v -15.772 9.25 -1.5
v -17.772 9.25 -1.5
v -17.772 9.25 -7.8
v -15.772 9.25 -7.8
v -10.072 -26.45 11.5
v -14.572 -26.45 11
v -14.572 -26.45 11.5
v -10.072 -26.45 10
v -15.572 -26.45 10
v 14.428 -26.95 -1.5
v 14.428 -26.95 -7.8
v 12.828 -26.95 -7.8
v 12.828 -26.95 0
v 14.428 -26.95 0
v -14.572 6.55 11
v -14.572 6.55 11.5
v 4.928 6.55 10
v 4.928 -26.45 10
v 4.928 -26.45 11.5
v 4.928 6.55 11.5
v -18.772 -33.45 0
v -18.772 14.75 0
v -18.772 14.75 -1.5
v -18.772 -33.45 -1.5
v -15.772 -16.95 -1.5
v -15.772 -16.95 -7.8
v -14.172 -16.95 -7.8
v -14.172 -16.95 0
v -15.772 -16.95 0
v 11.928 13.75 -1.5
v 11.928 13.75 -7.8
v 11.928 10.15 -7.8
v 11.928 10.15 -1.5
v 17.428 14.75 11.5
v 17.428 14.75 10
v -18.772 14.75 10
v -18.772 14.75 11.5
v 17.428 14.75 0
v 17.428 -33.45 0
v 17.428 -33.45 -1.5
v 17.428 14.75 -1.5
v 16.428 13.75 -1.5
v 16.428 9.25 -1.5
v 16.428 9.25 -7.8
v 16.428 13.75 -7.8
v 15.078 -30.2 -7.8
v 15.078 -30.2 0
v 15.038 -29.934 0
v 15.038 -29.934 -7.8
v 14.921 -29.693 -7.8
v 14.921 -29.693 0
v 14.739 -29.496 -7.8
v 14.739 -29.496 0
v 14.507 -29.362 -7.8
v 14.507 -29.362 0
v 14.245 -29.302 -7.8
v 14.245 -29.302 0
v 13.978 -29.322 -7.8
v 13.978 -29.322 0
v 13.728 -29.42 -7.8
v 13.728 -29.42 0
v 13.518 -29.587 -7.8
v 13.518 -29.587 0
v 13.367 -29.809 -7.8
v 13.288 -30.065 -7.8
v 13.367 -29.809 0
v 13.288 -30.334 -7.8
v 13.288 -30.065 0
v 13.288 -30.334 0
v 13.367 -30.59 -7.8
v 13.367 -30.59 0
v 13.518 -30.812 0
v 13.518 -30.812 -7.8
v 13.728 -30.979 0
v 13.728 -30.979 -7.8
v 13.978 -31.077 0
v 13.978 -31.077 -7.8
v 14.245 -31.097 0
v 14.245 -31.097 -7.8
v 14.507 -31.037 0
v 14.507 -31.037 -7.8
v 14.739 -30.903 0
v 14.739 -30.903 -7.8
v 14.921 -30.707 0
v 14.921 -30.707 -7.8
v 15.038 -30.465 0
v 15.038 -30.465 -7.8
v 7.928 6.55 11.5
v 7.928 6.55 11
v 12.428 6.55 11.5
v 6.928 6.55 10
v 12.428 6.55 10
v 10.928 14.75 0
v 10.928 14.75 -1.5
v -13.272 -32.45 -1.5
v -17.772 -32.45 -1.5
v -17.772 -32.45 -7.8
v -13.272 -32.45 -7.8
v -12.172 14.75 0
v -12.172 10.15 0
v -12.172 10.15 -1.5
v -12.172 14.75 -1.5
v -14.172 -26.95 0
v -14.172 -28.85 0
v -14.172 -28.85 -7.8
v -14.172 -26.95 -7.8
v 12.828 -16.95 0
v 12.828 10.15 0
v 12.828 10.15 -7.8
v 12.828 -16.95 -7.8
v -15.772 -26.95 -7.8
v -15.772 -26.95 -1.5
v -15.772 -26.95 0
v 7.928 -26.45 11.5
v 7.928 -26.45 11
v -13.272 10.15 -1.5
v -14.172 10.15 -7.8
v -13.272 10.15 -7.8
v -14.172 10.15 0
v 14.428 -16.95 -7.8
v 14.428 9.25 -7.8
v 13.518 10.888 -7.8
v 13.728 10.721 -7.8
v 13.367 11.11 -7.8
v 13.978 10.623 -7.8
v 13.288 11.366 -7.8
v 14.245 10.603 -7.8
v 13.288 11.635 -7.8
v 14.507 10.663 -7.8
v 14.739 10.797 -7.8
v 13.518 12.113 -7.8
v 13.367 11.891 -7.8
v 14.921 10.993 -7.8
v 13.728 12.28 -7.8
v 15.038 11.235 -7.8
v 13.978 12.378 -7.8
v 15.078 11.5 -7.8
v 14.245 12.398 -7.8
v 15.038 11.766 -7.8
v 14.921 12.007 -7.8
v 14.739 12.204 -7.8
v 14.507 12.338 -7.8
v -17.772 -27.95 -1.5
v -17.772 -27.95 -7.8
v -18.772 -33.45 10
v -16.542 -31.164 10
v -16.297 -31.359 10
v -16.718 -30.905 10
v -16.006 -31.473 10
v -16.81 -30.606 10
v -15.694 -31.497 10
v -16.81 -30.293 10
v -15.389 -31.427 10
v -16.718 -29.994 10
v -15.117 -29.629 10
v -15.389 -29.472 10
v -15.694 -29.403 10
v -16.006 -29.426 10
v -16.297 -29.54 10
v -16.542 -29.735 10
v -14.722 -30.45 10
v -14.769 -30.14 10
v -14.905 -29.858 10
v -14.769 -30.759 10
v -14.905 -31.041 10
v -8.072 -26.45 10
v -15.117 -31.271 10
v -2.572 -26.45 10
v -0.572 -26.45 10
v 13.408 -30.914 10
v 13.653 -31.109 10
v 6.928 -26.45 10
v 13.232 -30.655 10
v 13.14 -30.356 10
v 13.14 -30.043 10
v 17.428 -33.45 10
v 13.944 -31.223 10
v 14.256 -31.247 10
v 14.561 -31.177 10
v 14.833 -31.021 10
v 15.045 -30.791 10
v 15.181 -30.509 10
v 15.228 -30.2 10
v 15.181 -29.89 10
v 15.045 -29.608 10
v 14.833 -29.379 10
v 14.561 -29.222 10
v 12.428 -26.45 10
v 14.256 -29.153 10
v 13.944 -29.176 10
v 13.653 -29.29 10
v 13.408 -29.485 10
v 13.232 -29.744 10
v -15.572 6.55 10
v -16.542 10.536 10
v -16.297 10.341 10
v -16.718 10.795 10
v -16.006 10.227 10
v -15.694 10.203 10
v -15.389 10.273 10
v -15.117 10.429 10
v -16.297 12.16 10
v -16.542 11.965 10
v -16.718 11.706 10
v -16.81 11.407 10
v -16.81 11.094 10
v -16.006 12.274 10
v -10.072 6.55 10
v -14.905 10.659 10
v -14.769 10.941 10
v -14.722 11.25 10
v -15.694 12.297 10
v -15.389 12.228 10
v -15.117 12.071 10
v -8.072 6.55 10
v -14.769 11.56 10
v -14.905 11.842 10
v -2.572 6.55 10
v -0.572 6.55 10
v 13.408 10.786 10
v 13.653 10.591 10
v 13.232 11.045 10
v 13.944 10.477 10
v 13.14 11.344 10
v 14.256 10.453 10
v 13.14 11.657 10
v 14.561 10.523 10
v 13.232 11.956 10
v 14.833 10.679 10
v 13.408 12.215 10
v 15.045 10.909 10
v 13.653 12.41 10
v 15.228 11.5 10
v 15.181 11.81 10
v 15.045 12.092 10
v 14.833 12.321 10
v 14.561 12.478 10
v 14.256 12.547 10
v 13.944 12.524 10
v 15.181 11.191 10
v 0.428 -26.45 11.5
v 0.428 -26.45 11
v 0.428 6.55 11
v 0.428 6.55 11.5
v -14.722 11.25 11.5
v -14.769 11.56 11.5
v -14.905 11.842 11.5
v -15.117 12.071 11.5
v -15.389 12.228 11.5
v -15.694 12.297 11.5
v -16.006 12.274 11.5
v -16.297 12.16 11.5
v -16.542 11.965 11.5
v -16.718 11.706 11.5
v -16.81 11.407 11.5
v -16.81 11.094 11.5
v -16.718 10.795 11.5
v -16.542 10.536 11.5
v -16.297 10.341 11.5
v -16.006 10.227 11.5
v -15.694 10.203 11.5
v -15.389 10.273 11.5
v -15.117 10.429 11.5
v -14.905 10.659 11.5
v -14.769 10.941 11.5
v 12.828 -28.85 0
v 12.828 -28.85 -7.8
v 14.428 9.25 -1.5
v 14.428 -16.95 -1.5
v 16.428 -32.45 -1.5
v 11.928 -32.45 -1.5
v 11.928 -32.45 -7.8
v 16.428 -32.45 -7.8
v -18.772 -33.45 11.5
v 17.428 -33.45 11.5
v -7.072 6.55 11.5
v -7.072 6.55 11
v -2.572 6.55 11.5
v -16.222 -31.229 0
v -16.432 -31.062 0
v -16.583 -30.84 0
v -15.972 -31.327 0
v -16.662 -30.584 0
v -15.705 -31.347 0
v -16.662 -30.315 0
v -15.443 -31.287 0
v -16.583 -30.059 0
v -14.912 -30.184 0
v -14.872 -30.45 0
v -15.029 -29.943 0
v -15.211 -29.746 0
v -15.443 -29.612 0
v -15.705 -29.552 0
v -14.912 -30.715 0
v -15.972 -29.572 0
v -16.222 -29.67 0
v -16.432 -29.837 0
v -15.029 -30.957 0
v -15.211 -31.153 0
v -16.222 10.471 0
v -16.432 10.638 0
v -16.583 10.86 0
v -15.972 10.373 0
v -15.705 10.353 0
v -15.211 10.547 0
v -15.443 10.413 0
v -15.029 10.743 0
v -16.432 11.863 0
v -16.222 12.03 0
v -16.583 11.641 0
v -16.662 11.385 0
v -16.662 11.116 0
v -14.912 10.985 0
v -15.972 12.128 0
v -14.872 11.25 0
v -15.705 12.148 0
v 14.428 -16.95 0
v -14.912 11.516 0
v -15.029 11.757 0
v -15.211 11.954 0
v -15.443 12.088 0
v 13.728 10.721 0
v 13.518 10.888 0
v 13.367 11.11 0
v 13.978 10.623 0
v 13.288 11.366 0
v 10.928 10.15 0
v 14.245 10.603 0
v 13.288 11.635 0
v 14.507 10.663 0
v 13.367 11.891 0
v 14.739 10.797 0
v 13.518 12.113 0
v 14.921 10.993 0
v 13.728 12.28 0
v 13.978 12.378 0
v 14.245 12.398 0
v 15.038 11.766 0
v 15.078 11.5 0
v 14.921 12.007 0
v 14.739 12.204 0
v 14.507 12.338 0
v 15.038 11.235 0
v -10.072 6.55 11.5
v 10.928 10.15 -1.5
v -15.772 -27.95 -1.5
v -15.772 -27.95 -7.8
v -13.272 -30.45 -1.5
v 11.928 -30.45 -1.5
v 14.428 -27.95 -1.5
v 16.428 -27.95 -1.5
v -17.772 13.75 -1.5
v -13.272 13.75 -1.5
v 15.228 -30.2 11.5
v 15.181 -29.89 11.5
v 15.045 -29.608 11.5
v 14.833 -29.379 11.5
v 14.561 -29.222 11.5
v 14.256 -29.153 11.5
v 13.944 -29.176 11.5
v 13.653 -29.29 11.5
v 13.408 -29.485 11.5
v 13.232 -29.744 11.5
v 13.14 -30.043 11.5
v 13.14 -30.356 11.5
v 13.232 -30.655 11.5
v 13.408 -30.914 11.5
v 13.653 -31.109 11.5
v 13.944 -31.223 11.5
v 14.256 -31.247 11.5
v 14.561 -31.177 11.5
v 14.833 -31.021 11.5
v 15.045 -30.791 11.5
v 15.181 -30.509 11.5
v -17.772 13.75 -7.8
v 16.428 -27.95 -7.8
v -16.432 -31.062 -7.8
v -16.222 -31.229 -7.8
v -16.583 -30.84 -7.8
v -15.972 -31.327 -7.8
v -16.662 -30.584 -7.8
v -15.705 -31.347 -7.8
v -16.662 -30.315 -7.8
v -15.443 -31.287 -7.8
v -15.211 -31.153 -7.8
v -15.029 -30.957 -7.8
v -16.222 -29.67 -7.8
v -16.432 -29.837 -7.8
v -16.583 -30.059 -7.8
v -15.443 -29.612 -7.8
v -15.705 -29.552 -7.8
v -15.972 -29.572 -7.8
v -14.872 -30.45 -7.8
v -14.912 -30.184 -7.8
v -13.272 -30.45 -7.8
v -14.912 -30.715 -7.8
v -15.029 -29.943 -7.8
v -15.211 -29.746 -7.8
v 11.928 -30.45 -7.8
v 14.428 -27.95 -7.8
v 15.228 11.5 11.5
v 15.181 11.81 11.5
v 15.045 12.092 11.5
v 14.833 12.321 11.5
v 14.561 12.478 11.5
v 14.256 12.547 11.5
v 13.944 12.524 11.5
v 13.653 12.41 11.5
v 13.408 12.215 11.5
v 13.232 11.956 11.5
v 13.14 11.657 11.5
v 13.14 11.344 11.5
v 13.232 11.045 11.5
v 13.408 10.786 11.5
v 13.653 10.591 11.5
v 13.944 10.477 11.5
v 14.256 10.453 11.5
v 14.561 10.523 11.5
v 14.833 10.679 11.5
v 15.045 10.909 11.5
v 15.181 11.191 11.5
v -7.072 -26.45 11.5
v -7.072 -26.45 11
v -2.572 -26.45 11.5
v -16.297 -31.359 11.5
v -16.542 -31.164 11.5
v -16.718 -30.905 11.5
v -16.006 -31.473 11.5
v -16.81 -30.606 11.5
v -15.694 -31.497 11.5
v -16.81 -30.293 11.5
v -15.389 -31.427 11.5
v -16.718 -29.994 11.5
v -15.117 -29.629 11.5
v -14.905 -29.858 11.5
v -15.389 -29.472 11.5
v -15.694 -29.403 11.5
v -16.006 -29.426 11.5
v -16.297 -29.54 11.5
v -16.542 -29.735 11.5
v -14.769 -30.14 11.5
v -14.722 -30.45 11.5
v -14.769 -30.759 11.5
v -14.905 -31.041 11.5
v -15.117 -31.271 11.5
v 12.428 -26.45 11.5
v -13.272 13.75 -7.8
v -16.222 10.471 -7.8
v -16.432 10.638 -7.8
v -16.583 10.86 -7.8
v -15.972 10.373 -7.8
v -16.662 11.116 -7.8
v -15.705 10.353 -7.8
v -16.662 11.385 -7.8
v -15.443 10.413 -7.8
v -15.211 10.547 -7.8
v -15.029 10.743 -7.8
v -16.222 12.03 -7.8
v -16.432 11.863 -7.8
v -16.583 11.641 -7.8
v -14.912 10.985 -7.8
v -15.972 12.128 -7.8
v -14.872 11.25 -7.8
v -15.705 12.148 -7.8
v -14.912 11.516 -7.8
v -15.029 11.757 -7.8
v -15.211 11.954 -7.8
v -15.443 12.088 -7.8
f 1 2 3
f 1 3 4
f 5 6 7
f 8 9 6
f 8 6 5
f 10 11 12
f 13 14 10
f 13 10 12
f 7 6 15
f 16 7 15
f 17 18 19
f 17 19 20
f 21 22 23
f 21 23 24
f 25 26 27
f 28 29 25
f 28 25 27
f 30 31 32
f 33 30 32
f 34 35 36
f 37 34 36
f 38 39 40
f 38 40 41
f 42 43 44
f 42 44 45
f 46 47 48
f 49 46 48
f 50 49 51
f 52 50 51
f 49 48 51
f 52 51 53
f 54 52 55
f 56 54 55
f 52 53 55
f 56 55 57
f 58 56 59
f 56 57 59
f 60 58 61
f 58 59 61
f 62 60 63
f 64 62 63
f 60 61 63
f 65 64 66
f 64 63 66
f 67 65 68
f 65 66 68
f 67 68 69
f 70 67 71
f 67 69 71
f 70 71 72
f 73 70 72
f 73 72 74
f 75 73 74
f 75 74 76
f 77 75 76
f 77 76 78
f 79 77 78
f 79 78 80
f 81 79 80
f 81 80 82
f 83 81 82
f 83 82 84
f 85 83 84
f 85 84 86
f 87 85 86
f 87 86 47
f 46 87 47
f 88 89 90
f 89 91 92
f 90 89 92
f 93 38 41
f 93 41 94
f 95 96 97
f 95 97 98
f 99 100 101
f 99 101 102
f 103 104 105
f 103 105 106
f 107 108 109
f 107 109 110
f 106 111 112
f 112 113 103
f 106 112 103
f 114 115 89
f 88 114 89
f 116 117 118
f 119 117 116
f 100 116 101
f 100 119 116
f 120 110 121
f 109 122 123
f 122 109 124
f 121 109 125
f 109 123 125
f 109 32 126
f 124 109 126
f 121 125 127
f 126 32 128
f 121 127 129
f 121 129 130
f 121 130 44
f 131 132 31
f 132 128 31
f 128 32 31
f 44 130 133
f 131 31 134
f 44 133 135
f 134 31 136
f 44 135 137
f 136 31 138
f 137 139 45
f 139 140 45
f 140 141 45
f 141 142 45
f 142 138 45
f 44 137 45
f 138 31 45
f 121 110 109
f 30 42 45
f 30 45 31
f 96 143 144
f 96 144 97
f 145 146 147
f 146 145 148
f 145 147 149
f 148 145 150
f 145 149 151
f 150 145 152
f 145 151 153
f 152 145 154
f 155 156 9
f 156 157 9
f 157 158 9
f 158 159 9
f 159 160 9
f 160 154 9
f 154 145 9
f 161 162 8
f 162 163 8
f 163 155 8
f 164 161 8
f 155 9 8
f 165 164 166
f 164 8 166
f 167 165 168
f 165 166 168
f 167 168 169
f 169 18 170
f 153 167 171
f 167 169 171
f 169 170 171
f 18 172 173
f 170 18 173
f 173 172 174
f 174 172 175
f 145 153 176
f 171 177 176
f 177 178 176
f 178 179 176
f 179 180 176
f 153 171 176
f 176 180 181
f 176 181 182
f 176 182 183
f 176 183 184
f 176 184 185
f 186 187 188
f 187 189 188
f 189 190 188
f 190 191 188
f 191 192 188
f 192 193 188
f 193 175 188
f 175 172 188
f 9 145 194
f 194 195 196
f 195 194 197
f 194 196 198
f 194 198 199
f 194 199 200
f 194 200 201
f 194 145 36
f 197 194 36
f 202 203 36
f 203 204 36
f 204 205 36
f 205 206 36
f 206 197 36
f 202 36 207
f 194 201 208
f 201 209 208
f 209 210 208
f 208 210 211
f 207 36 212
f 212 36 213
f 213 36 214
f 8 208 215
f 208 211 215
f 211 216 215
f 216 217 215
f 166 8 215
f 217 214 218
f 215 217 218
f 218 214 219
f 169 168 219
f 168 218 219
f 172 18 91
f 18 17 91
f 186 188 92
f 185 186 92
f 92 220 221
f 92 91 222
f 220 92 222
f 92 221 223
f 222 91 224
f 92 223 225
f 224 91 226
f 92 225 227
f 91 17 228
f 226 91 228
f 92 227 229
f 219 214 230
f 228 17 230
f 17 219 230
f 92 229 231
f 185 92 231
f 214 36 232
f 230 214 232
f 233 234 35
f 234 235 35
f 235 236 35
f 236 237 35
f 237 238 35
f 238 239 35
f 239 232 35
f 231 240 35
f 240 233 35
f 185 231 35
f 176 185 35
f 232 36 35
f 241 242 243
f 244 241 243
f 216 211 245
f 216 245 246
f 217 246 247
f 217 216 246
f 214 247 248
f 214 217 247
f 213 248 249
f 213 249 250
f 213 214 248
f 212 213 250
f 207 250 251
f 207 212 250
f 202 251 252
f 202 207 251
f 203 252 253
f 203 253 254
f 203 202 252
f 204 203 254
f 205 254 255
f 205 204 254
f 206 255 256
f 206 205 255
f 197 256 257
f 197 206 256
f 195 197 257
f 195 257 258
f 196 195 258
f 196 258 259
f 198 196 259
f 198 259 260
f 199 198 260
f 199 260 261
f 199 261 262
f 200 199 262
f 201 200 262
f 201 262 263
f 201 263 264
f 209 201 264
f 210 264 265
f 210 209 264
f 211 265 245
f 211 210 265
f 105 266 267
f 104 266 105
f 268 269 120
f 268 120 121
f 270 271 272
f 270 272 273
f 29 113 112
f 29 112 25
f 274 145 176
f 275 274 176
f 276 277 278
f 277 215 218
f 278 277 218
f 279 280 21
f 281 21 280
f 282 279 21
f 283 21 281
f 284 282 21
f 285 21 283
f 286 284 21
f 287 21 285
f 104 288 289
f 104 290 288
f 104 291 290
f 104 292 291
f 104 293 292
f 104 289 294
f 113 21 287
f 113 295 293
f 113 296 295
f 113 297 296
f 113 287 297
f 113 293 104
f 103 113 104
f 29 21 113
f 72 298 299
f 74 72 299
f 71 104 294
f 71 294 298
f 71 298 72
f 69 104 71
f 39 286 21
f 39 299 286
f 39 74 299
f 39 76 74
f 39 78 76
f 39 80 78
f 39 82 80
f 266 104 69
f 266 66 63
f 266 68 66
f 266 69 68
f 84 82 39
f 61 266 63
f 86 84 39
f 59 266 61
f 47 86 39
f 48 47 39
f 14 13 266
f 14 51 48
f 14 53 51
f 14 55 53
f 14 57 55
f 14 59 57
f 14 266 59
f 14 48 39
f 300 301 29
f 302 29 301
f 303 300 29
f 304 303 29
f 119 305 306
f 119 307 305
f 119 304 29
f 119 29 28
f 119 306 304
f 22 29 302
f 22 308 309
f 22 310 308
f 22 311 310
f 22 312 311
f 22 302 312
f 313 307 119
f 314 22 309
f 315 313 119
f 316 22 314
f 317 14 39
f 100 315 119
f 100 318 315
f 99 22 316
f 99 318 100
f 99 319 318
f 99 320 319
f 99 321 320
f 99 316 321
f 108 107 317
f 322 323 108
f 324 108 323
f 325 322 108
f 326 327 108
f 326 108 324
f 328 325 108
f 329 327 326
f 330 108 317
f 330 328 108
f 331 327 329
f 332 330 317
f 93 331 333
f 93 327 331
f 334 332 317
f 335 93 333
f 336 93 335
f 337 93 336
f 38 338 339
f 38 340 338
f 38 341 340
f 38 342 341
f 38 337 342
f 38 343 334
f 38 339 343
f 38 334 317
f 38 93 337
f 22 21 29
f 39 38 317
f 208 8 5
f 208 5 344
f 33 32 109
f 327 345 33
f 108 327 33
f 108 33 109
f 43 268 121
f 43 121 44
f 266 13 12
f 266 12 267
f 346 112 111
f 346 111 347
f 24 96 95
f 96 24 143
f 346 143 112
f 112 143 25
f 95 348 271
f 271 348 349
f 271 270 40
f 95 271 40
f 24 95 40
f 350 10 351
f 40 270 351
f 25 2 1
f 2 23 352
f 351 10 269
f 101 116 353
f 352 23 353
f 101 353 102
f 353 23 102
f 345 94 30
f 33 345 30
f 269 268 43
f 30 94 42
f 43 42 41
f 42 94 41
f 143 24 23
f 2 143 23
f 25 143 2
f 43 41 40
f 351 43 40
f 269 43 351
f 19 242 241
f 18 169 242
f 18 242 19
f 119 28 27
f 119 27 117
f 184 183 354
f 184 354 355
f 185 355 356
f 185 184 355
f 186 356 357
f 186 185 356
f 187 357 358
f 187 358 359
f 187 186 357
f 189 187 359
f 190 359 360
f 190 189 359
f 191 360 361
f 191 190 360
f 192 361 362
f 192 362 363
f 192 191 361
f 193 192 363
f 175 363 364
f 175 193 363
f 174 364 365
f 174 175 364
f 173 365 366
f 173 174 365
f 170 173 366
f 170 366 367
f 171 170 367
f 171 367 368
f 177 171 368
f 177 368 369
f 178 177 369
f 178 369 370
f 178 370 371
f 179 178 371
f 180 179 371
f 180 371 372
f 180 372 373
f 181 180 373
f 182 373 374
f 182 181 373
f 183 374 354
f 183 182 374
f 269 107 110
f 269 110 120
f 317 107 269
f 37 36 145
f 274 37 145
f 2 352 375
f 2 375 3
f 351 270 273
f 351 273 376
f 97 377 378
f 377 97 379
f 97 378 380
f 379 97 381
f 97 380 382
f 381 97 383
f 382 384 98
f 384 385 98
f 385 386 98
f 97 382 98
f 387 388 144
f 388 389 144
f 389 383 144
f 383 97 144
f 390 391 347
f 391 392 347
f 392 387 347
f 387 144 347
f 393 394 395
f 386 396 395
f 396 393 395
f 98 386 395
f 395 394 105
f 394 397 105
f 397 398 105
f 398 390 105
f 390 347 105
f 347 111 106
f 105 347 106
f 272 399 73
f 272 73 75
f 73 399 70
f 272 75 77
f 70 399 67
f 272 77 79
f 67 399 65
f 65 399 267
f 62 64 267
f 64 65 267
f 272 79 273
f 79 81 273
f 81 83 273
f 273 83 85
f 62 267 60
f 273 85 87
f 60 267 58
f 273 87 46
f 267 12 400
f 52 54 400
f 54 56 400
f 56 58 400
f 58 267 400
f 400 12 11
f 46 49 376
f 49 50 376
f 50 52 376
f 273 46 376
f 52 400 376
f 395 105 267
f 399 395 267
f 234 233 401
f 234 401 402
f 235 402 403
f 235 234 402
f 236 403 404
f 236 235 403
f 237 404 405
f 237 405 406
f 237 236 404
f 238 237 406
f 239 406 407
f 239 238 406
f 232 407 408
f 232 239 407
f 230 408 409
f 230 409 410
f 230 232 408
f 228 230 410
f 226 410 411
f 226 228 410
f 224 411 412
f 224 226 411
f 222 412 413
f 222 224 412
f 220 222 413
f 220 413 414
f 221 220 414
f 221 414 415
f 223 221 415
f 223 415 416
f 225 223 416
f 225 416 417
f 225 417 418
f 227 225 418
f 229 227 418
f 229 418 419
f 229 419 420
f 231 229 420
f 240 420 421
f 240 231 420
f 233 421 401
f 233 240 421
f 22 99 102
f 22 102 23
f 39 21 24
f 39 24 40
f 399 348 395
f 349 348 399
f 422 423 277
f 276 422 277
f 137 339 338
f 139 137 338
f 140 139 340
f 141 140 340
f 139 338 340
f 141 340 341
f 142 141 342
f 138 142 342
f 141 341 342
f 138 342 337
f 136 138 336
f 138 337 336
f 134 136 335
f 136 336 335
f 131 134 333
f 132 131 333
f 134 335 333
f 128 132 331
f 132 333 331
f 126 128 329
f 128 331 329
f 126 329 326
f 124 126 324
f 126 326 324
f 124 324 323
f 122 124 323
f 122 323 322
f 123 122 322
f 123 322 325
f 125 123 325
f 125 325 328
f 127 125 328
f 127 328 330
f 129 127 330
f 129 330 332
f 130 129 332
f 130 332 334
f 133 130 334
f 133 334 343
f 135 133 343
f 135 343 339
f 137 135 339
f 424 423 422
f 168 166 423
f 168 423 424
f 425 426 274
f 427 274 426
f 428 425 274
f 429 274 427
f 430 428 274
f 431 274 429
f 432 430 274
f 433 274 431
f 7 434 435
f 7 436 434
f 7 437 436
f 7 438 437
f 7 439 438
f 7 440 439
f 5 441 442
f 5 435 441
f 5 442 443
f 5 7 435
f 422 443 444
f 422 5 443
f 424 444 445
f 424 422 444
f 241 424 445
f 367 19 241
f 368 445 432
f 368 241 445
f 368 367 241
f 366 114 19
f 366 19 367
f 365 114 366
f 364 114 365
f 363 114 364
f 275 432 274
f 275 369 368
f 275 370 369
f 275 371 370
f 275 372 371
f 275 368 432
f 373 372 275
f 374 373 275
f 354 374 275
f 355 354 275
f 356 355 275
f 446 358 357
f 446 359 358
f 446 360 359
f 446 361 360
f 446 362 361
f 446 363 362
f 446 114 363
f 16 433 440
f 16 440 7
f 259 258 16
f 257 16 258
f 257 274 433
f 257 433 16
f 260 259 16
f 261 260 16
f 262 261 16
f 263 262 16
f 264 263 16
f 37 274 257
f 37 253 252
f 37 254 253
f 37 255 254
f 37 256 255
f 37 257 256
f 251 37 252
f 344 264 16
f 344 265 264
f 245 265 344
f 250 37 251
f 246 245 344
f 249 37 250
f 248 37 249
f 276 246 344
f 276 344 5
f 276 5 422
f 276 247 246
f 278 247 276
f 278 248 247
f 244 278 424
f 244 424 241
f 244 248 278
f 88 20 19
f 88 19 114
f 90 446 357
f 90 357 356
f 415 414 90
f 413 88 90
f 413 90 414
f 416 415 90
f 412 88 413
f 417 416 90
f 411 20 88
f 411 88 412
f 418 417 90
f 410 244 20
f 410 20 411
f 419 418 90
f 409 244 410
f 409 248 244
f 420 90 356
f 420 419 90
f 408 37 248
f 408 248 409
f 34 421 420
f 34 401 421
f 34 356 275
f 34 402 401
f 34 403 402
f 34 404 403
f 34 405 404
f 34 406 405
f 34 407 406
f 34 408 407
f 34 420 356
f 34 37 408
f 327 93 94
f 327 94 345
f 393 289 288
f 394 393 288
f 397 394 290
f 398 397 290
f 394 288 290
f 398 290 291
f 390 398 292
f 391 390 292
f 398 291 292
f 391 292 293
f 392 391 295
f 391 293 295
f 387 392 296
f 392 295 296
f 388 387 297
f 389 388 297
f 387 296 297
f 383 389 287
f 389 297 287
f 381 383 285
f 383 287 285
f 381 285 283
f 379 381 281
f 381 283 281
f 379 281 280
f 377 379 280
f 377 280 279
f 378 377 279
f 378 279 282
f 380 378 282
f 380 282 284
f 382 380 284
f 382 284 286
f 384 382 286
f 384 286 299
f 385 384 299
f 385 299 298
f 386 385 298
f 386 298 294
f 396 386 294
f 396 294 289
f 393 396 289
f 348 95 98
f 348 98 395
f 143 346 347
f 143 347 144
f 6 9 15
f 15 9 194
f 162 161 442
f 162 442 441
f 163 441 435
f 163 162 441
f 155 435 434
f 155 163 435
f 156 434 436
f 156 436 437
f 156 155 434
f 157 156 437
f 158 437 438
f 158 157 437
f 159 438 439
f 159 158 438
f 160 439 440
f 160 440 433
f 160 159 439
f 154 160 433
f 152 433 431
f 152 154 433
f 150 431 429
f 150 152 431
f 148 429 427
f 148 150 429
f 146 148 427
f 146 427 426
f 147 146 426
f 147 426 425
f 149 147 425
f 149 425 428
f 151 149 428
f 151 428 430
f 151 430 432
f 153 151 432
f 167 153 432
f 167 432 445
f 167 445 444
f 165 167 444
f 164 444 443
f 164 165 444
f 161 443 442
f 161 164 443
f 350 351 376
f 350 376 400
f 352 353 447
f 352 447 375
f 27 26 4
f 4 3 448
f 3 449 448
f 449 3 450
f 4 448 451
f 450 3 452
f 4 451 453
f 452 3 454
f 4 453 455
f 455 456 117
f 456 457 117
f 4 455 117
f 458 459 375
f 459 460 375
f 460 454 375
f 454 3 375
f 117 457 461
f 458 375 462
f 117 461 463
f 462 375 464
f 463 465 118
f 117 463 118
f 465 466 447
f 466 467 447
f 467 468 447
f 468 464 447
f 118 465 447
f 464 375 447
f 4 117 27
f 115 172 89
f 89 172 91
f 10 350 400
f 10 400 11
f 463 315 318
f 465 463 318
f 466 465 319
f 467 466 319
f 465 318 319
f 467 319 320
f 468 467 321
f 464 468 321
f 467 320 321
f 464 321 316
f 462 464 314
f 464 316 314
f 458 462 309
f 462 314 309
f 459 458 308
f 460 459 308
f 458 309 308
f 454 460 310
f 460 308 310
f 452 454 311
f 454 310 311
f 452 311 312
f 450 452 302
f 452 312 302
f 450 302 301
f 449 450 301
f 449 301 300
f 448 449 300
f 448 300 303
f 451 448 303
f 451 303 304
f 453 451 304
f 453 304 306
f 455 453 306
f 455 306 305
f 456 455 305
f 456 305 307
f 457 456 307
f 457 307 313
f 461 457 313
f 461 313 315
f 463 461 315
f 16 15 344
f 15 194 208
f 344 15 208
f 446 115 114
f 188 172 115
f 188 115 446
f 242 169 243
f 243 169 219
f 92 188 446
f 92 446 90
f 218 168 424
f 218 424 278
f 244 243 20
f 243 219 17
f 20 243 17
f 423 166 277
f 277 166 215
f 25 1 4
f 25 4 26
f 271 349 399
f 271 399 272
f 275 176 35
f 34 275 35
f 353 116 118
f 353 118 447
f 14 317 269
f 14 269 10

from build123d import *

# Parameters (mm, degrees)
F0_W     = 1.6
F0_H     = 1
F1_DEPTH = 7.8
F0_H_2   = 26.2
F0_W_2   = 0.5
F2_DEPTH = 1.5
F3_DEPTH = 7.8
F5_R     = 0.9
F6_DEPTH = 8
F8_R     = 1.05
F8_W     = 4.5
F8_H     = 33
F9_DEPTH = 1.5
F10_SIZE = 1


# Not quite as in the source:
# - a feature names something its author has since deleted; it is built from what else it names


with BuildPart() as f1:
    # F0 (on Top) → F1 (new body)
    with BuildSketch(Plane.XY):
        with BuildLine():
            Line((-14.1721238852, -28.8496168345), (-14.1721238852, -27.9496168345))
            Line((-14.1721238852, -27.9496168345), (-15.7721238852, -27.9496168345))
            Line((-15.7721238852, -27.9496168345), (-15.7721238852, -28.4496168345))
            ThreePointArc((-15.7721238852, -28.4496168345), (-14.3579103228, -29.0354032721), (-13.7721238852, -30.4496168345))
            Line((-13.7721238852, -30.4496168345), (-13.2721238852, -30.4496168345))
            Line((-13.2721238852, -30.4496168345), (-13.2721238852, -28.8496168345))
            Line((-13.2721238852, -28.8496168345), (-14.1721238852, -28.8496168345))
        make_face()
        Polygon((11.9278761148, -28.8496168345), (-13.2721238852, -28.8496168345), (-13.2721238852, -30.4496168345), (11.9278761148, -30.4496168345), (11.9278761148, -30.1996168345), align=None)
        with BuildLine():
            Line((12.3778761148, -28.8496168345), (11.9278761148, -28.8496168345))
            Line((11.9278761148, -28.8496168345), (11.9278761148, -30.1996168345))
            ThreePointArc((11.9278761148, -30.1996168345), (12.0433386942, -29.488104361), (12.3778761148, -28.8496168345))
        make_face()
        with BuildLine():
            ThreePointArc((14.1778761148, -27.9496168345), (13.4663636413, -28.0650794139), (12.8278761148, -28.3996168345))
            Line((12.8278761148, -28.3996168345), (12.8278761148, -28.8496168345))
            Line((12.8278761148, -28.8496168345), (12.3778761148, -28.8496168345))
            ThreePointArc((12.3778761148, -28.8496168345), (12.0433386942, -29.488104361), (11.9278761148, -30.1996168345))
            ThreePointArc((11.9278761148, -30.1996168345), (11.9313618205, -30.3248107853), (11.9418081373, -30.4496168345))
            Line((11.9418081373, -30.4496168345), (14.4278761148, -30.4496168345))
            Line((14.4278761148, -30.4496168345), (14.4278761148, -27.963548857))
            ThreePointArc((14.4278761148, -27.963548857), (14.3030700656, -27.9531025402), (14.1778761148, -27.9496168345))
        make_face()
        with BuildLine():
            Line((14.1778761148, -27.9496168345), (12.8278761148, -27.9496168345))
            Line((12.8278761148, -27.9496168345), (12.8278761148, -28.3996168345))
            ThreePointArc((12.8278761148, -28.3996168345), (13.4663636413, -28.0650794139), (14.1778761148, -27.9496168345))
        make_face()
        with BuildLine():
            ThreePointArc((11.9418081373, -30.4496168345), (11.9313618205, -30.3248107853), (11.9278761148, -30.1996168345))
            Line((11.9278761148, -30.1996168345), (11.9278761148, -30.4496168345))
            Line((11.9278761148, -30.4496168345), (11.9418081373, -30.4496168345))
        make_face()
        with BuildLine():
            Line((14.4278761148, -27.9496168345), (14.1778761148, -27.9496168345))
            ThreePointArc((14.1778761148, -27.9496168345), (14.3030700656, -27.9531025402), (14.4278761148, -27.963548857))
            Line((14.4278761148, -27.963548857), (14.4278761148, -27.9496168345))
        make_face()
        with BuildLine():
            ThreePointArc((-13.7721238852, -30.4496168345), (-14.3579103228, -29.0354032721), (-15.7721238852, -28.4496168345))
            Line((-15.7721238852, -28.4496168345), (-15.7721238852, -30.4496168345))
            Line((-15.7721238852, -30.4496168345), (-13.7721238852, -30.4496168345))
        make_face()
        with Locations((-14.9721238852, -27.4496168345)):
            Rectangle(F0_W, F0_H)
        Polygon((14.4278761148, -26.9496168345), (12.8278761148, -26.9496168345), (12.8278761148, -27.9496168345), (14.1778761148, -27.9496168345), (14.4278761148, -27.9496168345), align=None)
    extrude(amount=-F1_DEPTH)



with BuildPart() as f1b:
    # F0 (on Top) → F1, piece 2 (new body)
    with BuildSketch(Plane.XY):
        Polygon((14.1778761148, 9.2503831655), (12.8278761148, 9.2503831655), (12.8278761148, -16.9496168345), (14.4278761148, -16.9496168345), (14.4278761148, 9.2503831655), align=None)
        with BuildLine():
            ThreePointArc((11.9278761148, 11.5003831655), (12.0433386942, 10.7888706919), (12.3778761148, 10.1503831655))
            Line((12.3778761148, 10.1503831655), (12.8278761148, 10.1503831655))
            Line((12.8278761148, 10.1503831655), (12.8278761148, 9.7003831655))
            ThreePointArc((12.8278761148, 9.7003831655), (13.4663636413, 9.3658457449), (14.1778761148, 9.2503831655))
            ThreePointArc((14.1778761148, 9.2503831655), (14.3030700656, 9.2538688711), (14.4278761148, 9.264315188))
            Line((14.4278761148, 9.264315188), (14.4278761148, 11.7503831655))
            Line((14.4278761148, 11.7503831655), (11.9418081373, 11.7503831655))
            ThreePointArc((11.9418081373, 11.7503831655), (11.9313618205, 11.6255771163), (11.9278761148, 11.5003831655))
        make_face()
        with BuildLine():
            Line((11.9278761148, 11.5003831655), (11.9278761148, 10.1503831655))
            Line((11.9278761148, 10.1503831655), (12.3778761148, 10.1503831655))
            ThreePointArc((12.3778761148, 10.1503831655), (12.0433386942, 10.7888706919), (11.9278761148, 11.5003831655))
        make_face()
        with BuildLine():
            Line((11.9278761148, 11.7503831655), (11.9278761148, 11.5003831655))
            ThreePointArc((11.9278761148, 11.5003831655), (11.9313618205, 11.6255771163), (11.9418081373, 11.7503831655))
            Line((11.9418081373, 11.7503831655), (11.9278761148, 11.7503831655))
        make_face()
        with BuildLine():
            ThreePointArc((14.4278761148, 9.264315188), (14.3030700656, 9.2538688711), (14.1778761148, 9.2503831655))
            Line((14.1778761148, 9.2503831655), (14.4278761148, 9.2503831655))
            Line((14.4278761148, 9.2503831655), (14.4278761148, 9.264315188))
        make_face()
        with BuildLine():
            ThreePointArc((14.1778761148, 9.2503831655), (13.4663636413, 9.3658457449), (12.8278761148, 9.7003831655))
            Line((12.8278761148, 9.7003831655), (12.8278761148, 9.2503831655))
            Line((12.8278761148, 9.2503831655), (14.1778761148, 9.2503831655))
        make_face()
    extrude(amount=-F1_DEPTH)


with BuildPart() as f1c:
    # F0 (on Top) → F1, piece 3 (new body)
    with BuildSketch(Plane.XY):
        with Locations((-14.9721238852, -3.8496168345)):
            Rectangle(F0_W, F0_H_2)
        with BuildLine():
            Line((-14.1017945763, 10.1503831655), (-13.2721238852, 10.1503831655))
            Line((-13.2721238852, 10.1503831655), (-13.2721238852, 13.7503831655))
            Line((-13.2721238852, 13.7503831655), (-13.7721238852, 13.7503831655))
            Line((-13.7721238852, 13.7503831655), (-13.7721238852, 11.7503831655))
            Line((-13.7721238852, 11.7503831655), (-13.8356322121, 11.7503831655))
            ThreePointArc((-13.8356322121, 11.7503831655), (-13.7880644926, 11.5023917504), (-13.7721238852, 11.2503831655))
            ThreePointArc((-13.7721238852, 11.2503831655), (-13.8563135321, 10.6762135989), (-14.1017945763, 10.1503831655))
        make_face()
        with BuildLine():
            Line((-14.1721238852, 9.2503831655), (-14.1721238852, 10.0503831655))
            ThreePointArc((-14.1721238852, 10.0503831655), (-14.8776966942, 9.4615287835), (-15.7721238852, 9.2503831655))
            Line((-15.7721238852, 9.2503831655), (-14.1721238852, 9.2503831655))
        make_face()
        with BuildLine():
            Line((-14.1721238852, 10.1503831655), (-14.1017945763, 10.1503831655))
            ThreePointArc((-14.1017945763, 10.1503831655), (-13.8563135321, 10.6762135989), (-13.7721238852, 11.2503831655))
            ThreePointArc((-13.7721238852, 11.2503831655), (-13.7880644926, 11.5023917504), (-13.8356322121, 11.7503831655))
            Line((-13.8356322121, 11.7503831655), (-15.7721238852, 11.7503831655))
            Line((-15.7721238852, 11.7503831655), (-15.7721238852, 9.2503831655))
            ThreePointArc((-15.7721238852, 9.2503831655), (-14.8776966942, 9.4615287835), (-14.1721238852, 10.0503831655))
            Line((-14.1721238852, 10.0503831655), (-14.1721238852, 10.1503831655))
        make_face()
    extrude(amount=-F1_DEPTH)


with BuildPart() as f1_1:
    add(f1.part)

    add(f1b.part)  # F2 merges F1b

    add(f1c.part)  # F2 merges F1c
    # F0 (on Top) → F2 (join)
    with BuildSketch(Plane.XY):
        Polygon((10.9278761148, 14.7503831655), (10.9278761148, 11.7503831655), (11.9278761148, 11.7503831655), (11.9278761148, 13.7503831655), (14.177876148, 13.7503831655), (16.4278761148, 13.7503831655), (16.4278761148, 11.5003831655), (16.4278761148, 9.2503831655), (14.4278761148, 9.2503831655), (14.4278761148, -16.9496168345), (14.4278761148, -26.9496168345), (14.4278761148, -27.9496168345), (16.4278761148, -27.9496168345), (16.4278761148, -30.1996168345), (16.4278761148, -32.4496168345), (14.1778761148, -32.4496168345), (11.9278761148, -32.4496168345), (11.9278761148, -30.4496168345), (-13.2721238852, -30.4496168345), (-13.2721238852, -32.4496168345), (-15.7721238852, -32.4496168345), (-17.7721238852, -32.4496168345), (-17.7721238852, -30.4496168345), (-17.7721238852, -27.9496168345), (-15.7721238852, -27.9496168345), (-15.7721238852, -26.9496168345), (-15.7721238852, -16.9496168345), (-15.7721238852, 9.2503831655), (-17.7721238852, 9.2503831655), (-17.7721238852, 11.2503831655), (-17.7721238852, 13.7503831655), (-13.7721238852, 13.7503831655), (-13.7721238852, 14.7503831655), (-18.7721238852, 14.7503831655), (-18.7721238852, -33.4496168345), (17.4278761148, -33.4496168345), (17.4278761148, 14.7503831655), align=None)
        with BuildLine():
            Line((-13.7721238852, 11.7503831655), (-13.7721238852, 13.7503831655))
            Line((-13.7721238852, 13.7503831655), (-17.7721238852, 13.7503831655))
            Line((-17.7721238852, 13.7503831655), (-17.7721238852, 11.2503831655))
            ThreePointArc((-17.7721238852, 11.2503831655), (-16.0241324701, 13.234442558), (-13.8356322121, 11.7503831655))
            Line((-13.8356322121, 11.7503831655), (-13.7721238852, 11.7503831655))
        make_face()
        with BuildLine():
            ThreePointArc((-17.7721238852, 11.2503831655), (-17.1863374475, 9.8361696031), (-15.7721238852, 9.2503831655))
            Line((-15.7721238852, 9.2503831655), (-15.7721238852, 11.7503831655))
            Line((-15.7721238852, 11.7503831655), (-13.8356322121, 11.7503831655))
            ThreePointArc((-13.8356322121, 11.7503831655), (-16.0241324701, 13.234442558), (-17.7721238852, 11.2503831655))
        make_face()
        with BuildLine():
            Line((-17.7721238852, 9.2503831655), (-15.7721238852, 9.2503831655))
            ThreePointArc((-15.7721238852, 9.2503831655), (-17.1863374475, 9.8361696031), (-17.7721238852, 11.2503831655))
            Line((-17.7721238852, 11.2503831655), (-17.7721238852, 9.2503831655))
        make_face()
        with BuildLine():
            Line((14.4278761148, 9.264315188), (14.4278761148, 9.2503831655))
            Line((14.4278761148, 9.2503831655), (16.4278761148, 9.2503831655))
            Line((16.4278761148, 9.2503831655), (16.4278761148, 11.5003831655))
            ThreePointArc((16.4278761148, 11.5003831655), (15.854927098, 10.0003831655), (14.4278761148, 9.264315188))
        make_face()
        with BuildLine():
            ThreePointArc((14.177876148, 13.7503831655), (12.6778761272, 13.1774341597), (11.9418081373, 11.7503831655))
            Line((11.9418081373, 11.7503831655), (14.4278761148, 11.7503831655))
            Line((14.4278761148, 11.7503831655), (14.4278761148, 9.264315188))
            ThreePointArc((14.4278761148, 9.264315188), (15.854927098, 10.0003831655), (16.4278761148, 11.5003831655))
            ThreePointArc((16.4278761148, 11.5003831655), (15.7688663842, 13.0913734114), (14.177876148, 13.7503831655))
        make_face()
        with BuildLine():
            Line((16.4278761148, 13.7503831655), (14.177876148, 13.7503831655))
            ThreePointArc((14.177876148, 13.7503831655), (15.7688663842, 13.0913734114), (16.4278761148, 11.5003831655))
            Line((16.4278761148, 11.5003831655), (16.4278761148, 13.7503831655))
        make_face()
        with BuildLine():
            Line((11.9278761148, 13.7503831655), (11.9278761148, 11.7503831655))
            Line((11.9278761148, 11.7503831655), (11.9418081373, 11.7503831655))
            ThreePointArc((11.9418081373, 11.7503831655), (12.6778761272, 13.1774341597), (14.177876148, 13.7503831655))
            Line((14.177876148, 13.7503831655), (11.9278761148, 13.7503831655))
        make_face()
        with BuildLine():
            Line((-13.2721238852, -30.4496168345), (-13.7721238852, -30.4496168345))
            ThreePointArc((-13.7721238852, -30.4496168345), (-14.3579103228, -31.8638303969), (-15.7721238852, -32.4496168345))
            Line((-15.7721238852, -32.4496168345), (-13.2721238852, -32.4496168345))
            Line((-13.2721238852, -32.4496168345), (-13.2721238852, -30.4496168345))
        make_face()
        with BuildLine():
            Line((-15.7721238852, -30.4496168345), (-15.7721238852, -28.4496168345))
            ThreePointArc((-15.7721238852, -28.4496168345), (-17.1863374475, -29.0354032721), (-17.7721238852, -30.4496168345))
            ThreePointArc((-17.7721238852, -30.4496168345), (-17.1863374475, -31.8638303969), (-15.7721238852, -32.4496168345))
            ThreePointArc((-15.7721238852, -32.4496168345), (-14.3579103228, -31.8638303969), (-13.7721238852, -30.4496168345))
            Line((-13.7721238852, -30.4496168345), (-15.7721238852, -30.4496168345))
        make_face()
        with BuildLine():
            ThreePointArc((-15.7721238852, -32.4496168345), (-17.1863374475, -31.8638303969), (-17.7721238852, -30.4496168345))
            Line((-17.7721238852, -30.4496168345), (-17.7721238852, -32.4496168345))
            Line((-17.7721238852, -32.4496168345), (-15.7721238852, -32.4496168345))
        make_face()
        with BuildLine():
            Line((-15.7721238852, -28.4496168345), (-15.7721238852, -27.9496168345))
            Line((-15.7721238852, -27.9496168345), (-17.7721238852, -27.9496168345))
            Line((-17.7721238852, -27.9496168345), (-17.7721238852, -30.4496168345))
            ThreePointArc((-17.7721238852, -30.4496168345), (-17.1863374475, -29.0354032721), (-15.7721238852, -28.4496168345))
        make_face()
        with BuildLine():
            Line((16.4278761148, -27.9496168345), (14.4278761148, -27.9496168345))
            Line((14.4278761148, -27.9496168345), (14.4278761148, -27.963548857))
            ThreePointArc((14.4278761148, -27.963548857), (15.854927098, -28.6996168345), (16.4278761148, -30.1996168345))
            Line((16.4278761148, -30.1996168345), (16.4278761148, -27.9496168345))
        make_face()
        with BuildLine():
            ThreePointArc((16.4278761148, -30.1996168345), (15.854927098, -28.6996168345), (14.4278761148, -27.963548857))
            Line((14.4278761148, -27.963548857), (14.4278761148, -30.4496168345))
            Line((14.4278761148, -30.4496168345), (11.9418081373, -30.4496168345))
            ThreePointArc((11.9418081373, -30.4496168345), (12.6778761148, -31.8766678176), (14.1778761148, -32.4496168345))
            ThreePointArc((14.1778761148, -32.4496168345), (15.7688663725, -31.7906070922), (16.4278761148, -30.1996168345))
        make_face()
        with BuildLine():
            Line((16.4278761148, -32.4496168345), (16.4278761148, -30.1996168345))
            ThreePointArc((16.4278761148, -30.1996168345), (15.7688663725, -31.7906070922), (14.1778761148, -32.4496168345))
            Line((14.1778761148, -32.4496168345), (16.4278761148, -32.4496168345))
        make_face()
        with BuildLine():
            Line((11.9418081373, -30.4496168345), (11.9278761148, -30.4496168345))
            Line((11.9278761148, -30.4496168345), (11.9278761148, -32.4496168345))
            Line((11.9278761148, -32.4496168345), (14.1778761148, -32.4496168345))
            ThreePointArc((14.1778761148, -32.4496168345), (12.6778761148, -31.8766678176), (11.9418081373, -30.4496168345))
        make_face()
        with Locations((-13.5221238852, 14.2503831655)):
            Rectangle(F0_W_2, F0_H)
        with BuildLine():
            Line((-14.1017945763, 10.1503831655), (-13.2721238852, 10.1503831655))
            Line((-13.2721238852, 10.1503831655), (-13.2721238852, 13.7503831655))
            Line((-13.2721238852, 13.7503831655), (-13.7721238852, 13.7503831655))
            Line((-13.7721238852, 13.7503831655), (-13.7721238852, 11.7503831655))
            Line((-13.7721238852, 11.7503831655), (-13.8356322121, 11.7503831655))
            ThreePointArc((-13.8356322121, 11.7503831655), (-13.7880644926, 11.5023917504), (-13.7721238852, 11.2503831655))
            ThreePointArc((-13.7721238852, 11.2503831655), (-13.8563135321, 10.6762135989), (-14.1017945763, 10.1503831655))
        make_face()
        Polygon((-13.2721238852, 10.1503831655), (-12.1721238852, 10.1503831655), (-12.1721238852, 14.7503831655), (-13.2721238852, 14.7503831655), (-13.2721238852, 13.7503831655), align=None)
        Polygon((10.9278761148, 11.7503831655), (10.9278761148, 10.1503831655), (11.9278761148, 10.1503831655), (11.9278761148, 11.5003831655), (11.9278761148, 11.7503831655), align=None)
    extrude(amount=-F2_DEPTH)

    # F0 (on Top) → F3 (join)
    with BuildSketch(Plane.XY):
        with BuildLine():
            ThreePointArc((14.177876148, 13.7503831655), (12.6778761272, 13.1774341597), (11.9418081373, 11.7503831655))
            Line((11.9418081373, 11.7503831655), (14.4278761148, 11.7503831655))
            Line((14.4278761148, 11.7503831655), (14.4278761148, 9.264315188))
            ThreePointArc((14.4278761148, 9.264315188), (15.854927098, 10.0003831655), (16.4278761148, 11.5003831655))
            ThreePointArc((16.4278761148, 11.5003831655), (15.7688663842, 13.0913734114), (14.177876148, 13.7503831655))
        make_face()
        with BuildLine():
            ThreePointArc((14.1778761148, 9.2503831655), (13.4663636413, 9.3658457449), (12.8278761148, 9.7003831655))
            Line((12.8278761148, 9.7003831655), (12.8278761148, 9.2503831655))
            Line((12.8278761148, 9.2503831655), (14.1778761148, 9.2503831655))
        make_face()
        with BuildLine():
            Line((11.9278761148, 13.7503831655), (11.9278761148, 11.7503831655))
            Line((11.9278761148, 11.7503831655), (11.9418081373, 11.7503831655))
            ThreePointArc((11.9418081373, 11.7503831655), (12.6778761272, 13.1774341597), (14.177876148, 13.7503831655))
            Line((14.177876148, 13.7503831655), (11.9278761148, 13.7503831655))
        make_face()
        with BuildLine():
            ThreePointArc((11.9278761148, 11.5003831655), (12.0433386942, 10.7888706919), (12.3778761148, 10.1503831655))
            Line((12.3778761148, 10.1503831655), (12.8278761148, 10.1503831655))
            Line((12.8278761148, 10.1503831655), (12.8278761148, 9.7003831655))
            ThreePointArc((12.8278761148, 9.7003831655), (13.4663636413, 9.3658457449), (14.1778761148, 9.2503831655))
            ThreePointArc((14.1778761148, 9.2503831655), (14.3030700656, 9.2538688711), (14.4278761148, 9.264315188))
            Line((14.4278761148, 9.264315188), (14.4278761148, 11.7503831655))
            Line((14.4278761148, 11.7503831655), (11.9418081373, 11.7503831655))
            ThreePointArc((11.9418081373, 11.7503831655), (11.9313618205, 11.6255771163), (11.9278761148, 11.5003831655))
        make_face()
        with BuildLine():
            Line((11.9278761148, 11.5003831655), (11.9278761148, 10.1503831655))
            Line((11.9278761148, 10.1503831655), (12.3778761148, 10.1503831655))
            ThreePointArc((12.3778761148, 10.1503831655), (12.0433386942, 10.7888706919), (11.9278761148, 11.5003831655))
        make_face()
        with BuildLine():
            Line((-14.1721238852, 10.1503831655), (-14.1017945763, 10.1503831655))
            ThreePointArc((-14.1017945763, 10.1503831655), (-13.8563135321, 10.6762135989), (-13.7721238852, 11.2503831655))
            ThreePointArc((-13.7721238852, 11.2503831655), (-13.7880644926, 11.5023917504), (-13.8356322121, 11.7503831655))
            Line((-13.8356322121, 11.7503831655), (-15.7721238852, 11.7503831655))
            Line((-15.7721238852, 11.7503831655), (-15.7721238852, 9.2503831655))
            ThreePointArc((-15.7721238852, 9.2503831655), (-14.8776966942, 9.4615287835), (-14.1721238852, 10.0503831655))
            Line((-14.1721238852, 10.0503831655), (-14.1721238852, 10.1503831655))
        make_face()
        with BuildLine():
            ThreePointArc((-17.7721238852, 11.2503831655), (-17.1863374475, 9.8361696031), (-15.7721238852, 9.2503831655))
            Line((-15.7721238852, 9.2503831655), (-15.7721238852, 11.7503831655))
            Line((-15.7721238852, 11.7503831655), (-13.8356322121, 11.7503831655))
            ThreePointArc((-13.8356322121, 11.7503831655), (-16.0241324701, 13.234442558), (-17.7721238852, 11.2503831655))
        make_face()
        with BuildLine():
            Line((-13.7721238852, 11.7503831655), (-13.7721238852, 13.7503831655))
            Line((-13.7721238852, 13.7503831655), (-17.7721238852, 13.7503831655))
            Line((-17.7721238852, 13.7503831655), (-17.7721238852, 11.2503831655))
            ThreePointArc((-17.7721238852, 11.2503831655), (-16.0241324701, 13.234442558), (-13.8356322121, 11.7503831655))
            Line((-13.8356322121, 11.7503831655), (-13.7721238852, 11.7503831655))
        make_face()
        with BuildLine():
            Line((-17.7721238852, 9.2503831655), (-15.7721238852, 9.2503831655))
            ThreePointArc((-15.7721238852, 9.2503831655), (-17.1863374475, 9.8361696031), (-17.7721238852, 11.2503831655))
            Line((-17.7721238852, 11.2503831655), (-17.7721238852, 9.2503831655))
        make_face()
        with BuildLine():
            Line((-14.1721238852, 9.2503831655), (-14.1721238852, 10.0503831655))
            ThreePointArc((-14.1721238852, 10.0503831655), (-14.8776966942, 9.4615287835), (-15.7721238852, 9.2503831655))
            Line((-15.7721238852, 9.2503831655), (-14.1721238852, 9.2503831655))
        make_face()
        with BuildLine():
            Line((-14.1017945763, 10.1503831655), (-13.2721238852, 10.1503831655))
            Line((-13.2721238852, 10.1503831655), (-13.2721238852, 13.7503831655))
            Line((-13.2721238852, 13.7503831655), (-13.7721238852, 13.7503831655))
            Line((-13.7721238852, 13.7503831655), (-13.7721238852, 11.7503831655))
            Line((-13.7721238852, 11.7503831655), (-13.8356322121, 11.7503831655))
            ThreePointArc((-13.8356322121, 11.7503831655), (-13.7880644926, 11.5023917504), (-13.7721238852, 11.2503831655))
            ThreePointArc((-13.7721238852, 11.2503831655), (-13.8563135321, 10.6762135989), (-14.1017945763, 10.1503831655))
        make_face()
        with BuildLine():
            Line((16.4278761148, 13.7503831655), (14.177876148, 13.7503831655))
            ThreePointArc((14.177876148, 13.7503831655), (15.7688663842, 13.0913734114), (16.4278761148, 11.5003831655))
            Line((16.4278761148, 11.5003831655), (16.4278761148, 13.7503831655))
        make_face()
        with BuildLine():
            Line((14.4278761148, 9.264315188), (14.4278761148, 9.2503831655))
            Line((14.4278761148, 9.2503831655), (16.4278761148, 9.2503831655))
            Line((16.4278761148, 9.2503831655), (16.4278761148, 11.5003831655))
            ThreePointArc((16.4278761148, 11.5003831655), (15.854927098, 10.0003831655), (14.4278761148, 9.264315188))
        make_face()
        with BuildLine():
            ThreePointArc((16.4278761148, -30.1996168345), (15.854927098, -28.6996168345), (14.4278761148, -27.963548857))
            Line((14.4278761148, -27.963548857), (14.4278761148, -30.4496168345))
            Line((14.4278761148, -30.4496168345), (11.9418081373, -30.4496168345))
            ThreePointArc((11.9418081373, -30.4496168345), (12.6778761148, -31.8766678176), (14.1778761148, -32.4496168345))
            ThreePointArc((14.1778761148, -32.4496168345), (15.7688663725, -31.7906070922), (16.4278761148, -30.1996168345))
        make_face()
        with BuildLine():
            Line((16.4278761148, -27.9496168345), (14.4278761148, -27.9496168345))
            Line((14.4278761148, -27.9496168345), (14.4278761148, -27.963548857))
            ThreePointArc((14.4278761148, -27.963548857), (15.854927098, -28.6996168345), (16.4278761148, -30.1996168345))
            Line((16.4278761148, -30.1996168345), (16.4278761148, -27.9496168345))
        make_face()
        with BuildLine():
            Line((16.4278761148, -32.4496168345), (16.4278761148, -30.1996168345))
            ThreePointArc((16.4278761148, -30.1996168345), (15.7688663725, -31.7906070922), (14.1778761148, -32.4496168345))
            Line((14.1778761148, -32.4496168345), (16.4278761148, -32.4496168345))
        make_face()
        with BuildLine():
            Line((11.9418081373, -30.4496168345), (11.9278761148, -30.4496168345))
            Line((11.9278761148, -30.4496168345), (11.9278761148, -32.4496168345))
            Line((11.9278761148, -32.4496168345), (14.1778761148, -32.4496168345))
            ThreePointArc((14.1778761148, -32.4496168345), (12.6778761148, -31.8766678176), (11.9418081373, -30.4496168345))
        make_face()
        with BuildLine():
            ThreePointArc((14.1778761148, -27.9496168345), (13.4663636413, -28.0650794139), (12.8278761148, -28.3996168345))
            Line((12.8278761148, -28.3996168345), (12.8278761148, -28.8496168345))
            Line((12.8278761148, -28.8496168345), (12.3778761148, -28.8496168345))
            ThreePointArc((12.3778761148, -28.8496168345), (12.0433386942, -29.488104361), (11.9278761148, -30.1996168345))
            ThreePointArc((11.9278761148, -30.1996168345), (11.9313618205, -30.3248107853), (11.9418081373, -30.4496168345))
            Line((11.9418081373, -30.4496168345), (14.4278761148, -30.4496168345))
            Line((14.4278761148, -30.4496168345), (14.4278761148, -27.963548857))
            ThreePointArc((14.4278761148, -27.963548857), (14.3030700656, -27.9531025402), (14.1778761148, -27.9496168345))
        make_face()
        with BuildLine():
            Line((12.3778761148, -28.8496168345), (11.9278761148, -28.8496168345))
            Line((11.9278761148, -28.8496168345), (11.9278761148, -30.1996168345))
            ThreePointArc((11.9278761148, -30.1996168345), (12.0433386942, -29.488104361), (12.3778761148, -28.8496168345))
        make_face()
        with BuildLine():
            Line((14.1778761148, -27.9496168345), (12.8278761148, -27.9496168345))
            Line((12.8278761148, -27.9496168345), (12.8278761148, -28.3996168345))
            ThreePointArc((12.8278761148, -28.3996168345), (13.4663636413, -28.0650794139), (14.1778761148, -27.9496168345))
        make_face()
        with BuildLine():
            Line((-15.7721238852, -28.4496168345), (-15.7721238852, -27.9496168345))
            Line((-15.7721238852, -27.9496168345), (-17.7721238852, -27.9496168345))
            Line((-17.7721238852, -27.9496168345), (-17.7721238852, -30.4496168345))
            ThreePointArc((-17.7721238852, -30.4496168345), (-17.1863374475, -29.0354032721), (-15.7721238852, -28.4496168345))
        make_face()
        with BuildLine():
            Line((-14.1721238852, -28.8496168345), (-14.1721238852, -27.9496168345))
            Line((-14.1721238852, -27.9496168345), (-15.7721238852, -27.9496168345))
            Line((-15.7721238852, -27.9496168345), (-15.7721238852, -28.4496168345))
            ThreePointArc((-15.7721238852, -28.4496168345), (-14.3579103228, -29.0354032721), (-13.7721238852, -30.4496168345))
            Line((-13.7721238852, -30.4496168345), (-13.2721238852, -30.4496168345))
            Line((-13.2721238852, -30.4496168345), (-13.2721238852, -28.8496168345))
            Line((-13.2721238852, -28.8496168345), (-14.1721238852, -28.8496168345))
        make_face()
        with BuildLine():
            Line((-13.2721238852, -30.4496168345), (-13.7721238852, -30.4496168345))
            ThreePointArc((-13.7721238852, -30.4496168345), (-14.3579103228, -31.8638303969), (-15.7721238852, -32.4496168345))
            Line((-15.7721238852, -32.4496168345), (-13.2721238852, -32.4496168345))
            Line((-13.2721238852, -32.4496168345), (-13.2721238852, -30.4496168345))
        make_face()
        with BuildLine():
            ThreePointArc((-15.7721238852, -32.4496168345), (-17.1863374475, -31.8638303969), (-17.7721238852, -30.4496168345))
            Line((-17.7721238852, -30.4496168345), (-17.7721238852, -32.4496168345))
            Line((-17.7721238852, -32.4496168345), (-15.7721238852, -32.4496168345))
        make_face()
        with BuildLine():
            Line((-15.7721238852, -30.4496168345), (-15.7721238852, -28.4496168345))
            ThreePointArc((-15.7721238852, -28.4496168345), (-17.1863374475, -29.0354032721), (-17.7721238852, -30.4496168345))
            ThreePointArc((-17.7721238852, -30.4496168345), (-17.1863374475, -31.8638303969), (-15.7721238852, -32.4496168345))
            ThreePointArc((-15.7721238852, -32.4496168345), (-14.3579103228, -31.8638303969), (-13.7721238852, -30.4496168345))
            Line((-13.7721238852, -30.4496168345), (-15.7721238852, -30.4496168345))
        make_face()
        with BuildLine():
            ThreePointArc((-13.7721238852, -30.4496168345), (-14.3579103228, -29.0354032721), (-15.7721238852, -28.4496168345))
            Line((-15.7721238852, -28.4496168345), (-15.7721238852, -30.4496168345))
            Line((-15.7721238852, -30.4496168345), (-13.7721238852, -30.4496168345))
        make_face()
    extrude(amount=-F3_DEPTH)

    # F5 (on offset) → F6 (cut)
    with BuildSketch(Plane.XY):
        with Locations((14.1778761148, 11.5003831655)):
            Circle(F5_R)
        with Locations((14.1778761148, -30.1996168345)):
            Circle(F5_R)
        with Locations((-15.7721238852, -30.4496168345)):
            Circle(F5_R)
        with Locations((-15.7721238852, 11.2503831655)):
            Circle(F5_R)
    extrude(amount=-F6_DEPTH, mode=Mode.SUBTRACT)


with BuildPart() as f9:
    # F8 (on offset) → F9 (new body)
    with BuildSketch(Plane.XY.offset(10)):
        Polygon((-13.7721238852, 14.7503831655), (-18.7721238852, 14.7503831655), (-18.7721238852, -33.4496168345), (17.4278761148, -33.4496168345), (17.4278761148, 14.7503831655), (10.9278761148, 14.7503831655), align=None)
        with Locations((-15.7721238852, -30.4496168345)):
            Circle(F8_R, mode=Mode.SUBTRACT)
        with Locations((-12.3221238852, -9.9496168345)):
            Rectangle(F8_W, F8_H, mode=Mode.SUBTRACT)
        with Locations((-4.8221238852, -9.9496168345)):
            Rectangle(F8_W, F8_H, mode=Mode.SUBTRACT)
        with Locations((14.1778761148, -30.1996168345)):
            Circle(F8_R, mode=Mode.SUBTRACT)
        with Locations((2.6778761148, -9.9496168345)):
            Rectangle(F8_W, F8_H, mode=Mode.SUBTRACT)
        with Locations((10.1778761148, -9.9496168345)):
            Rectangle(F8_W, F8_H, mode=Mode.SUBTRACT)
        with Locations((-15.7721238852, 11.2503831655)):
            Circle(F8_R, mode=Mode.SUBTRACT)
        with Locations((14.1778761148, 11.5003831655)):
            Circle(F8_R, mode=Mode.SUBTRACT)
    extrude(amount=F9_DEPTH)

    # F10
    f10_edges = [f9.edges().sort_by_distance(p)[0] for p in [
        (7.927876, -9.949617, 10),
        (0.427876, -9.949617, 10),
        (-7.072124, -9.949617, 10),
        (-14.572124, -9.949617, 10),
    ]]
    chamfer(f10_edges, length=F10_SIZE)


solid = Compound([f1_1.part, f9.part])
